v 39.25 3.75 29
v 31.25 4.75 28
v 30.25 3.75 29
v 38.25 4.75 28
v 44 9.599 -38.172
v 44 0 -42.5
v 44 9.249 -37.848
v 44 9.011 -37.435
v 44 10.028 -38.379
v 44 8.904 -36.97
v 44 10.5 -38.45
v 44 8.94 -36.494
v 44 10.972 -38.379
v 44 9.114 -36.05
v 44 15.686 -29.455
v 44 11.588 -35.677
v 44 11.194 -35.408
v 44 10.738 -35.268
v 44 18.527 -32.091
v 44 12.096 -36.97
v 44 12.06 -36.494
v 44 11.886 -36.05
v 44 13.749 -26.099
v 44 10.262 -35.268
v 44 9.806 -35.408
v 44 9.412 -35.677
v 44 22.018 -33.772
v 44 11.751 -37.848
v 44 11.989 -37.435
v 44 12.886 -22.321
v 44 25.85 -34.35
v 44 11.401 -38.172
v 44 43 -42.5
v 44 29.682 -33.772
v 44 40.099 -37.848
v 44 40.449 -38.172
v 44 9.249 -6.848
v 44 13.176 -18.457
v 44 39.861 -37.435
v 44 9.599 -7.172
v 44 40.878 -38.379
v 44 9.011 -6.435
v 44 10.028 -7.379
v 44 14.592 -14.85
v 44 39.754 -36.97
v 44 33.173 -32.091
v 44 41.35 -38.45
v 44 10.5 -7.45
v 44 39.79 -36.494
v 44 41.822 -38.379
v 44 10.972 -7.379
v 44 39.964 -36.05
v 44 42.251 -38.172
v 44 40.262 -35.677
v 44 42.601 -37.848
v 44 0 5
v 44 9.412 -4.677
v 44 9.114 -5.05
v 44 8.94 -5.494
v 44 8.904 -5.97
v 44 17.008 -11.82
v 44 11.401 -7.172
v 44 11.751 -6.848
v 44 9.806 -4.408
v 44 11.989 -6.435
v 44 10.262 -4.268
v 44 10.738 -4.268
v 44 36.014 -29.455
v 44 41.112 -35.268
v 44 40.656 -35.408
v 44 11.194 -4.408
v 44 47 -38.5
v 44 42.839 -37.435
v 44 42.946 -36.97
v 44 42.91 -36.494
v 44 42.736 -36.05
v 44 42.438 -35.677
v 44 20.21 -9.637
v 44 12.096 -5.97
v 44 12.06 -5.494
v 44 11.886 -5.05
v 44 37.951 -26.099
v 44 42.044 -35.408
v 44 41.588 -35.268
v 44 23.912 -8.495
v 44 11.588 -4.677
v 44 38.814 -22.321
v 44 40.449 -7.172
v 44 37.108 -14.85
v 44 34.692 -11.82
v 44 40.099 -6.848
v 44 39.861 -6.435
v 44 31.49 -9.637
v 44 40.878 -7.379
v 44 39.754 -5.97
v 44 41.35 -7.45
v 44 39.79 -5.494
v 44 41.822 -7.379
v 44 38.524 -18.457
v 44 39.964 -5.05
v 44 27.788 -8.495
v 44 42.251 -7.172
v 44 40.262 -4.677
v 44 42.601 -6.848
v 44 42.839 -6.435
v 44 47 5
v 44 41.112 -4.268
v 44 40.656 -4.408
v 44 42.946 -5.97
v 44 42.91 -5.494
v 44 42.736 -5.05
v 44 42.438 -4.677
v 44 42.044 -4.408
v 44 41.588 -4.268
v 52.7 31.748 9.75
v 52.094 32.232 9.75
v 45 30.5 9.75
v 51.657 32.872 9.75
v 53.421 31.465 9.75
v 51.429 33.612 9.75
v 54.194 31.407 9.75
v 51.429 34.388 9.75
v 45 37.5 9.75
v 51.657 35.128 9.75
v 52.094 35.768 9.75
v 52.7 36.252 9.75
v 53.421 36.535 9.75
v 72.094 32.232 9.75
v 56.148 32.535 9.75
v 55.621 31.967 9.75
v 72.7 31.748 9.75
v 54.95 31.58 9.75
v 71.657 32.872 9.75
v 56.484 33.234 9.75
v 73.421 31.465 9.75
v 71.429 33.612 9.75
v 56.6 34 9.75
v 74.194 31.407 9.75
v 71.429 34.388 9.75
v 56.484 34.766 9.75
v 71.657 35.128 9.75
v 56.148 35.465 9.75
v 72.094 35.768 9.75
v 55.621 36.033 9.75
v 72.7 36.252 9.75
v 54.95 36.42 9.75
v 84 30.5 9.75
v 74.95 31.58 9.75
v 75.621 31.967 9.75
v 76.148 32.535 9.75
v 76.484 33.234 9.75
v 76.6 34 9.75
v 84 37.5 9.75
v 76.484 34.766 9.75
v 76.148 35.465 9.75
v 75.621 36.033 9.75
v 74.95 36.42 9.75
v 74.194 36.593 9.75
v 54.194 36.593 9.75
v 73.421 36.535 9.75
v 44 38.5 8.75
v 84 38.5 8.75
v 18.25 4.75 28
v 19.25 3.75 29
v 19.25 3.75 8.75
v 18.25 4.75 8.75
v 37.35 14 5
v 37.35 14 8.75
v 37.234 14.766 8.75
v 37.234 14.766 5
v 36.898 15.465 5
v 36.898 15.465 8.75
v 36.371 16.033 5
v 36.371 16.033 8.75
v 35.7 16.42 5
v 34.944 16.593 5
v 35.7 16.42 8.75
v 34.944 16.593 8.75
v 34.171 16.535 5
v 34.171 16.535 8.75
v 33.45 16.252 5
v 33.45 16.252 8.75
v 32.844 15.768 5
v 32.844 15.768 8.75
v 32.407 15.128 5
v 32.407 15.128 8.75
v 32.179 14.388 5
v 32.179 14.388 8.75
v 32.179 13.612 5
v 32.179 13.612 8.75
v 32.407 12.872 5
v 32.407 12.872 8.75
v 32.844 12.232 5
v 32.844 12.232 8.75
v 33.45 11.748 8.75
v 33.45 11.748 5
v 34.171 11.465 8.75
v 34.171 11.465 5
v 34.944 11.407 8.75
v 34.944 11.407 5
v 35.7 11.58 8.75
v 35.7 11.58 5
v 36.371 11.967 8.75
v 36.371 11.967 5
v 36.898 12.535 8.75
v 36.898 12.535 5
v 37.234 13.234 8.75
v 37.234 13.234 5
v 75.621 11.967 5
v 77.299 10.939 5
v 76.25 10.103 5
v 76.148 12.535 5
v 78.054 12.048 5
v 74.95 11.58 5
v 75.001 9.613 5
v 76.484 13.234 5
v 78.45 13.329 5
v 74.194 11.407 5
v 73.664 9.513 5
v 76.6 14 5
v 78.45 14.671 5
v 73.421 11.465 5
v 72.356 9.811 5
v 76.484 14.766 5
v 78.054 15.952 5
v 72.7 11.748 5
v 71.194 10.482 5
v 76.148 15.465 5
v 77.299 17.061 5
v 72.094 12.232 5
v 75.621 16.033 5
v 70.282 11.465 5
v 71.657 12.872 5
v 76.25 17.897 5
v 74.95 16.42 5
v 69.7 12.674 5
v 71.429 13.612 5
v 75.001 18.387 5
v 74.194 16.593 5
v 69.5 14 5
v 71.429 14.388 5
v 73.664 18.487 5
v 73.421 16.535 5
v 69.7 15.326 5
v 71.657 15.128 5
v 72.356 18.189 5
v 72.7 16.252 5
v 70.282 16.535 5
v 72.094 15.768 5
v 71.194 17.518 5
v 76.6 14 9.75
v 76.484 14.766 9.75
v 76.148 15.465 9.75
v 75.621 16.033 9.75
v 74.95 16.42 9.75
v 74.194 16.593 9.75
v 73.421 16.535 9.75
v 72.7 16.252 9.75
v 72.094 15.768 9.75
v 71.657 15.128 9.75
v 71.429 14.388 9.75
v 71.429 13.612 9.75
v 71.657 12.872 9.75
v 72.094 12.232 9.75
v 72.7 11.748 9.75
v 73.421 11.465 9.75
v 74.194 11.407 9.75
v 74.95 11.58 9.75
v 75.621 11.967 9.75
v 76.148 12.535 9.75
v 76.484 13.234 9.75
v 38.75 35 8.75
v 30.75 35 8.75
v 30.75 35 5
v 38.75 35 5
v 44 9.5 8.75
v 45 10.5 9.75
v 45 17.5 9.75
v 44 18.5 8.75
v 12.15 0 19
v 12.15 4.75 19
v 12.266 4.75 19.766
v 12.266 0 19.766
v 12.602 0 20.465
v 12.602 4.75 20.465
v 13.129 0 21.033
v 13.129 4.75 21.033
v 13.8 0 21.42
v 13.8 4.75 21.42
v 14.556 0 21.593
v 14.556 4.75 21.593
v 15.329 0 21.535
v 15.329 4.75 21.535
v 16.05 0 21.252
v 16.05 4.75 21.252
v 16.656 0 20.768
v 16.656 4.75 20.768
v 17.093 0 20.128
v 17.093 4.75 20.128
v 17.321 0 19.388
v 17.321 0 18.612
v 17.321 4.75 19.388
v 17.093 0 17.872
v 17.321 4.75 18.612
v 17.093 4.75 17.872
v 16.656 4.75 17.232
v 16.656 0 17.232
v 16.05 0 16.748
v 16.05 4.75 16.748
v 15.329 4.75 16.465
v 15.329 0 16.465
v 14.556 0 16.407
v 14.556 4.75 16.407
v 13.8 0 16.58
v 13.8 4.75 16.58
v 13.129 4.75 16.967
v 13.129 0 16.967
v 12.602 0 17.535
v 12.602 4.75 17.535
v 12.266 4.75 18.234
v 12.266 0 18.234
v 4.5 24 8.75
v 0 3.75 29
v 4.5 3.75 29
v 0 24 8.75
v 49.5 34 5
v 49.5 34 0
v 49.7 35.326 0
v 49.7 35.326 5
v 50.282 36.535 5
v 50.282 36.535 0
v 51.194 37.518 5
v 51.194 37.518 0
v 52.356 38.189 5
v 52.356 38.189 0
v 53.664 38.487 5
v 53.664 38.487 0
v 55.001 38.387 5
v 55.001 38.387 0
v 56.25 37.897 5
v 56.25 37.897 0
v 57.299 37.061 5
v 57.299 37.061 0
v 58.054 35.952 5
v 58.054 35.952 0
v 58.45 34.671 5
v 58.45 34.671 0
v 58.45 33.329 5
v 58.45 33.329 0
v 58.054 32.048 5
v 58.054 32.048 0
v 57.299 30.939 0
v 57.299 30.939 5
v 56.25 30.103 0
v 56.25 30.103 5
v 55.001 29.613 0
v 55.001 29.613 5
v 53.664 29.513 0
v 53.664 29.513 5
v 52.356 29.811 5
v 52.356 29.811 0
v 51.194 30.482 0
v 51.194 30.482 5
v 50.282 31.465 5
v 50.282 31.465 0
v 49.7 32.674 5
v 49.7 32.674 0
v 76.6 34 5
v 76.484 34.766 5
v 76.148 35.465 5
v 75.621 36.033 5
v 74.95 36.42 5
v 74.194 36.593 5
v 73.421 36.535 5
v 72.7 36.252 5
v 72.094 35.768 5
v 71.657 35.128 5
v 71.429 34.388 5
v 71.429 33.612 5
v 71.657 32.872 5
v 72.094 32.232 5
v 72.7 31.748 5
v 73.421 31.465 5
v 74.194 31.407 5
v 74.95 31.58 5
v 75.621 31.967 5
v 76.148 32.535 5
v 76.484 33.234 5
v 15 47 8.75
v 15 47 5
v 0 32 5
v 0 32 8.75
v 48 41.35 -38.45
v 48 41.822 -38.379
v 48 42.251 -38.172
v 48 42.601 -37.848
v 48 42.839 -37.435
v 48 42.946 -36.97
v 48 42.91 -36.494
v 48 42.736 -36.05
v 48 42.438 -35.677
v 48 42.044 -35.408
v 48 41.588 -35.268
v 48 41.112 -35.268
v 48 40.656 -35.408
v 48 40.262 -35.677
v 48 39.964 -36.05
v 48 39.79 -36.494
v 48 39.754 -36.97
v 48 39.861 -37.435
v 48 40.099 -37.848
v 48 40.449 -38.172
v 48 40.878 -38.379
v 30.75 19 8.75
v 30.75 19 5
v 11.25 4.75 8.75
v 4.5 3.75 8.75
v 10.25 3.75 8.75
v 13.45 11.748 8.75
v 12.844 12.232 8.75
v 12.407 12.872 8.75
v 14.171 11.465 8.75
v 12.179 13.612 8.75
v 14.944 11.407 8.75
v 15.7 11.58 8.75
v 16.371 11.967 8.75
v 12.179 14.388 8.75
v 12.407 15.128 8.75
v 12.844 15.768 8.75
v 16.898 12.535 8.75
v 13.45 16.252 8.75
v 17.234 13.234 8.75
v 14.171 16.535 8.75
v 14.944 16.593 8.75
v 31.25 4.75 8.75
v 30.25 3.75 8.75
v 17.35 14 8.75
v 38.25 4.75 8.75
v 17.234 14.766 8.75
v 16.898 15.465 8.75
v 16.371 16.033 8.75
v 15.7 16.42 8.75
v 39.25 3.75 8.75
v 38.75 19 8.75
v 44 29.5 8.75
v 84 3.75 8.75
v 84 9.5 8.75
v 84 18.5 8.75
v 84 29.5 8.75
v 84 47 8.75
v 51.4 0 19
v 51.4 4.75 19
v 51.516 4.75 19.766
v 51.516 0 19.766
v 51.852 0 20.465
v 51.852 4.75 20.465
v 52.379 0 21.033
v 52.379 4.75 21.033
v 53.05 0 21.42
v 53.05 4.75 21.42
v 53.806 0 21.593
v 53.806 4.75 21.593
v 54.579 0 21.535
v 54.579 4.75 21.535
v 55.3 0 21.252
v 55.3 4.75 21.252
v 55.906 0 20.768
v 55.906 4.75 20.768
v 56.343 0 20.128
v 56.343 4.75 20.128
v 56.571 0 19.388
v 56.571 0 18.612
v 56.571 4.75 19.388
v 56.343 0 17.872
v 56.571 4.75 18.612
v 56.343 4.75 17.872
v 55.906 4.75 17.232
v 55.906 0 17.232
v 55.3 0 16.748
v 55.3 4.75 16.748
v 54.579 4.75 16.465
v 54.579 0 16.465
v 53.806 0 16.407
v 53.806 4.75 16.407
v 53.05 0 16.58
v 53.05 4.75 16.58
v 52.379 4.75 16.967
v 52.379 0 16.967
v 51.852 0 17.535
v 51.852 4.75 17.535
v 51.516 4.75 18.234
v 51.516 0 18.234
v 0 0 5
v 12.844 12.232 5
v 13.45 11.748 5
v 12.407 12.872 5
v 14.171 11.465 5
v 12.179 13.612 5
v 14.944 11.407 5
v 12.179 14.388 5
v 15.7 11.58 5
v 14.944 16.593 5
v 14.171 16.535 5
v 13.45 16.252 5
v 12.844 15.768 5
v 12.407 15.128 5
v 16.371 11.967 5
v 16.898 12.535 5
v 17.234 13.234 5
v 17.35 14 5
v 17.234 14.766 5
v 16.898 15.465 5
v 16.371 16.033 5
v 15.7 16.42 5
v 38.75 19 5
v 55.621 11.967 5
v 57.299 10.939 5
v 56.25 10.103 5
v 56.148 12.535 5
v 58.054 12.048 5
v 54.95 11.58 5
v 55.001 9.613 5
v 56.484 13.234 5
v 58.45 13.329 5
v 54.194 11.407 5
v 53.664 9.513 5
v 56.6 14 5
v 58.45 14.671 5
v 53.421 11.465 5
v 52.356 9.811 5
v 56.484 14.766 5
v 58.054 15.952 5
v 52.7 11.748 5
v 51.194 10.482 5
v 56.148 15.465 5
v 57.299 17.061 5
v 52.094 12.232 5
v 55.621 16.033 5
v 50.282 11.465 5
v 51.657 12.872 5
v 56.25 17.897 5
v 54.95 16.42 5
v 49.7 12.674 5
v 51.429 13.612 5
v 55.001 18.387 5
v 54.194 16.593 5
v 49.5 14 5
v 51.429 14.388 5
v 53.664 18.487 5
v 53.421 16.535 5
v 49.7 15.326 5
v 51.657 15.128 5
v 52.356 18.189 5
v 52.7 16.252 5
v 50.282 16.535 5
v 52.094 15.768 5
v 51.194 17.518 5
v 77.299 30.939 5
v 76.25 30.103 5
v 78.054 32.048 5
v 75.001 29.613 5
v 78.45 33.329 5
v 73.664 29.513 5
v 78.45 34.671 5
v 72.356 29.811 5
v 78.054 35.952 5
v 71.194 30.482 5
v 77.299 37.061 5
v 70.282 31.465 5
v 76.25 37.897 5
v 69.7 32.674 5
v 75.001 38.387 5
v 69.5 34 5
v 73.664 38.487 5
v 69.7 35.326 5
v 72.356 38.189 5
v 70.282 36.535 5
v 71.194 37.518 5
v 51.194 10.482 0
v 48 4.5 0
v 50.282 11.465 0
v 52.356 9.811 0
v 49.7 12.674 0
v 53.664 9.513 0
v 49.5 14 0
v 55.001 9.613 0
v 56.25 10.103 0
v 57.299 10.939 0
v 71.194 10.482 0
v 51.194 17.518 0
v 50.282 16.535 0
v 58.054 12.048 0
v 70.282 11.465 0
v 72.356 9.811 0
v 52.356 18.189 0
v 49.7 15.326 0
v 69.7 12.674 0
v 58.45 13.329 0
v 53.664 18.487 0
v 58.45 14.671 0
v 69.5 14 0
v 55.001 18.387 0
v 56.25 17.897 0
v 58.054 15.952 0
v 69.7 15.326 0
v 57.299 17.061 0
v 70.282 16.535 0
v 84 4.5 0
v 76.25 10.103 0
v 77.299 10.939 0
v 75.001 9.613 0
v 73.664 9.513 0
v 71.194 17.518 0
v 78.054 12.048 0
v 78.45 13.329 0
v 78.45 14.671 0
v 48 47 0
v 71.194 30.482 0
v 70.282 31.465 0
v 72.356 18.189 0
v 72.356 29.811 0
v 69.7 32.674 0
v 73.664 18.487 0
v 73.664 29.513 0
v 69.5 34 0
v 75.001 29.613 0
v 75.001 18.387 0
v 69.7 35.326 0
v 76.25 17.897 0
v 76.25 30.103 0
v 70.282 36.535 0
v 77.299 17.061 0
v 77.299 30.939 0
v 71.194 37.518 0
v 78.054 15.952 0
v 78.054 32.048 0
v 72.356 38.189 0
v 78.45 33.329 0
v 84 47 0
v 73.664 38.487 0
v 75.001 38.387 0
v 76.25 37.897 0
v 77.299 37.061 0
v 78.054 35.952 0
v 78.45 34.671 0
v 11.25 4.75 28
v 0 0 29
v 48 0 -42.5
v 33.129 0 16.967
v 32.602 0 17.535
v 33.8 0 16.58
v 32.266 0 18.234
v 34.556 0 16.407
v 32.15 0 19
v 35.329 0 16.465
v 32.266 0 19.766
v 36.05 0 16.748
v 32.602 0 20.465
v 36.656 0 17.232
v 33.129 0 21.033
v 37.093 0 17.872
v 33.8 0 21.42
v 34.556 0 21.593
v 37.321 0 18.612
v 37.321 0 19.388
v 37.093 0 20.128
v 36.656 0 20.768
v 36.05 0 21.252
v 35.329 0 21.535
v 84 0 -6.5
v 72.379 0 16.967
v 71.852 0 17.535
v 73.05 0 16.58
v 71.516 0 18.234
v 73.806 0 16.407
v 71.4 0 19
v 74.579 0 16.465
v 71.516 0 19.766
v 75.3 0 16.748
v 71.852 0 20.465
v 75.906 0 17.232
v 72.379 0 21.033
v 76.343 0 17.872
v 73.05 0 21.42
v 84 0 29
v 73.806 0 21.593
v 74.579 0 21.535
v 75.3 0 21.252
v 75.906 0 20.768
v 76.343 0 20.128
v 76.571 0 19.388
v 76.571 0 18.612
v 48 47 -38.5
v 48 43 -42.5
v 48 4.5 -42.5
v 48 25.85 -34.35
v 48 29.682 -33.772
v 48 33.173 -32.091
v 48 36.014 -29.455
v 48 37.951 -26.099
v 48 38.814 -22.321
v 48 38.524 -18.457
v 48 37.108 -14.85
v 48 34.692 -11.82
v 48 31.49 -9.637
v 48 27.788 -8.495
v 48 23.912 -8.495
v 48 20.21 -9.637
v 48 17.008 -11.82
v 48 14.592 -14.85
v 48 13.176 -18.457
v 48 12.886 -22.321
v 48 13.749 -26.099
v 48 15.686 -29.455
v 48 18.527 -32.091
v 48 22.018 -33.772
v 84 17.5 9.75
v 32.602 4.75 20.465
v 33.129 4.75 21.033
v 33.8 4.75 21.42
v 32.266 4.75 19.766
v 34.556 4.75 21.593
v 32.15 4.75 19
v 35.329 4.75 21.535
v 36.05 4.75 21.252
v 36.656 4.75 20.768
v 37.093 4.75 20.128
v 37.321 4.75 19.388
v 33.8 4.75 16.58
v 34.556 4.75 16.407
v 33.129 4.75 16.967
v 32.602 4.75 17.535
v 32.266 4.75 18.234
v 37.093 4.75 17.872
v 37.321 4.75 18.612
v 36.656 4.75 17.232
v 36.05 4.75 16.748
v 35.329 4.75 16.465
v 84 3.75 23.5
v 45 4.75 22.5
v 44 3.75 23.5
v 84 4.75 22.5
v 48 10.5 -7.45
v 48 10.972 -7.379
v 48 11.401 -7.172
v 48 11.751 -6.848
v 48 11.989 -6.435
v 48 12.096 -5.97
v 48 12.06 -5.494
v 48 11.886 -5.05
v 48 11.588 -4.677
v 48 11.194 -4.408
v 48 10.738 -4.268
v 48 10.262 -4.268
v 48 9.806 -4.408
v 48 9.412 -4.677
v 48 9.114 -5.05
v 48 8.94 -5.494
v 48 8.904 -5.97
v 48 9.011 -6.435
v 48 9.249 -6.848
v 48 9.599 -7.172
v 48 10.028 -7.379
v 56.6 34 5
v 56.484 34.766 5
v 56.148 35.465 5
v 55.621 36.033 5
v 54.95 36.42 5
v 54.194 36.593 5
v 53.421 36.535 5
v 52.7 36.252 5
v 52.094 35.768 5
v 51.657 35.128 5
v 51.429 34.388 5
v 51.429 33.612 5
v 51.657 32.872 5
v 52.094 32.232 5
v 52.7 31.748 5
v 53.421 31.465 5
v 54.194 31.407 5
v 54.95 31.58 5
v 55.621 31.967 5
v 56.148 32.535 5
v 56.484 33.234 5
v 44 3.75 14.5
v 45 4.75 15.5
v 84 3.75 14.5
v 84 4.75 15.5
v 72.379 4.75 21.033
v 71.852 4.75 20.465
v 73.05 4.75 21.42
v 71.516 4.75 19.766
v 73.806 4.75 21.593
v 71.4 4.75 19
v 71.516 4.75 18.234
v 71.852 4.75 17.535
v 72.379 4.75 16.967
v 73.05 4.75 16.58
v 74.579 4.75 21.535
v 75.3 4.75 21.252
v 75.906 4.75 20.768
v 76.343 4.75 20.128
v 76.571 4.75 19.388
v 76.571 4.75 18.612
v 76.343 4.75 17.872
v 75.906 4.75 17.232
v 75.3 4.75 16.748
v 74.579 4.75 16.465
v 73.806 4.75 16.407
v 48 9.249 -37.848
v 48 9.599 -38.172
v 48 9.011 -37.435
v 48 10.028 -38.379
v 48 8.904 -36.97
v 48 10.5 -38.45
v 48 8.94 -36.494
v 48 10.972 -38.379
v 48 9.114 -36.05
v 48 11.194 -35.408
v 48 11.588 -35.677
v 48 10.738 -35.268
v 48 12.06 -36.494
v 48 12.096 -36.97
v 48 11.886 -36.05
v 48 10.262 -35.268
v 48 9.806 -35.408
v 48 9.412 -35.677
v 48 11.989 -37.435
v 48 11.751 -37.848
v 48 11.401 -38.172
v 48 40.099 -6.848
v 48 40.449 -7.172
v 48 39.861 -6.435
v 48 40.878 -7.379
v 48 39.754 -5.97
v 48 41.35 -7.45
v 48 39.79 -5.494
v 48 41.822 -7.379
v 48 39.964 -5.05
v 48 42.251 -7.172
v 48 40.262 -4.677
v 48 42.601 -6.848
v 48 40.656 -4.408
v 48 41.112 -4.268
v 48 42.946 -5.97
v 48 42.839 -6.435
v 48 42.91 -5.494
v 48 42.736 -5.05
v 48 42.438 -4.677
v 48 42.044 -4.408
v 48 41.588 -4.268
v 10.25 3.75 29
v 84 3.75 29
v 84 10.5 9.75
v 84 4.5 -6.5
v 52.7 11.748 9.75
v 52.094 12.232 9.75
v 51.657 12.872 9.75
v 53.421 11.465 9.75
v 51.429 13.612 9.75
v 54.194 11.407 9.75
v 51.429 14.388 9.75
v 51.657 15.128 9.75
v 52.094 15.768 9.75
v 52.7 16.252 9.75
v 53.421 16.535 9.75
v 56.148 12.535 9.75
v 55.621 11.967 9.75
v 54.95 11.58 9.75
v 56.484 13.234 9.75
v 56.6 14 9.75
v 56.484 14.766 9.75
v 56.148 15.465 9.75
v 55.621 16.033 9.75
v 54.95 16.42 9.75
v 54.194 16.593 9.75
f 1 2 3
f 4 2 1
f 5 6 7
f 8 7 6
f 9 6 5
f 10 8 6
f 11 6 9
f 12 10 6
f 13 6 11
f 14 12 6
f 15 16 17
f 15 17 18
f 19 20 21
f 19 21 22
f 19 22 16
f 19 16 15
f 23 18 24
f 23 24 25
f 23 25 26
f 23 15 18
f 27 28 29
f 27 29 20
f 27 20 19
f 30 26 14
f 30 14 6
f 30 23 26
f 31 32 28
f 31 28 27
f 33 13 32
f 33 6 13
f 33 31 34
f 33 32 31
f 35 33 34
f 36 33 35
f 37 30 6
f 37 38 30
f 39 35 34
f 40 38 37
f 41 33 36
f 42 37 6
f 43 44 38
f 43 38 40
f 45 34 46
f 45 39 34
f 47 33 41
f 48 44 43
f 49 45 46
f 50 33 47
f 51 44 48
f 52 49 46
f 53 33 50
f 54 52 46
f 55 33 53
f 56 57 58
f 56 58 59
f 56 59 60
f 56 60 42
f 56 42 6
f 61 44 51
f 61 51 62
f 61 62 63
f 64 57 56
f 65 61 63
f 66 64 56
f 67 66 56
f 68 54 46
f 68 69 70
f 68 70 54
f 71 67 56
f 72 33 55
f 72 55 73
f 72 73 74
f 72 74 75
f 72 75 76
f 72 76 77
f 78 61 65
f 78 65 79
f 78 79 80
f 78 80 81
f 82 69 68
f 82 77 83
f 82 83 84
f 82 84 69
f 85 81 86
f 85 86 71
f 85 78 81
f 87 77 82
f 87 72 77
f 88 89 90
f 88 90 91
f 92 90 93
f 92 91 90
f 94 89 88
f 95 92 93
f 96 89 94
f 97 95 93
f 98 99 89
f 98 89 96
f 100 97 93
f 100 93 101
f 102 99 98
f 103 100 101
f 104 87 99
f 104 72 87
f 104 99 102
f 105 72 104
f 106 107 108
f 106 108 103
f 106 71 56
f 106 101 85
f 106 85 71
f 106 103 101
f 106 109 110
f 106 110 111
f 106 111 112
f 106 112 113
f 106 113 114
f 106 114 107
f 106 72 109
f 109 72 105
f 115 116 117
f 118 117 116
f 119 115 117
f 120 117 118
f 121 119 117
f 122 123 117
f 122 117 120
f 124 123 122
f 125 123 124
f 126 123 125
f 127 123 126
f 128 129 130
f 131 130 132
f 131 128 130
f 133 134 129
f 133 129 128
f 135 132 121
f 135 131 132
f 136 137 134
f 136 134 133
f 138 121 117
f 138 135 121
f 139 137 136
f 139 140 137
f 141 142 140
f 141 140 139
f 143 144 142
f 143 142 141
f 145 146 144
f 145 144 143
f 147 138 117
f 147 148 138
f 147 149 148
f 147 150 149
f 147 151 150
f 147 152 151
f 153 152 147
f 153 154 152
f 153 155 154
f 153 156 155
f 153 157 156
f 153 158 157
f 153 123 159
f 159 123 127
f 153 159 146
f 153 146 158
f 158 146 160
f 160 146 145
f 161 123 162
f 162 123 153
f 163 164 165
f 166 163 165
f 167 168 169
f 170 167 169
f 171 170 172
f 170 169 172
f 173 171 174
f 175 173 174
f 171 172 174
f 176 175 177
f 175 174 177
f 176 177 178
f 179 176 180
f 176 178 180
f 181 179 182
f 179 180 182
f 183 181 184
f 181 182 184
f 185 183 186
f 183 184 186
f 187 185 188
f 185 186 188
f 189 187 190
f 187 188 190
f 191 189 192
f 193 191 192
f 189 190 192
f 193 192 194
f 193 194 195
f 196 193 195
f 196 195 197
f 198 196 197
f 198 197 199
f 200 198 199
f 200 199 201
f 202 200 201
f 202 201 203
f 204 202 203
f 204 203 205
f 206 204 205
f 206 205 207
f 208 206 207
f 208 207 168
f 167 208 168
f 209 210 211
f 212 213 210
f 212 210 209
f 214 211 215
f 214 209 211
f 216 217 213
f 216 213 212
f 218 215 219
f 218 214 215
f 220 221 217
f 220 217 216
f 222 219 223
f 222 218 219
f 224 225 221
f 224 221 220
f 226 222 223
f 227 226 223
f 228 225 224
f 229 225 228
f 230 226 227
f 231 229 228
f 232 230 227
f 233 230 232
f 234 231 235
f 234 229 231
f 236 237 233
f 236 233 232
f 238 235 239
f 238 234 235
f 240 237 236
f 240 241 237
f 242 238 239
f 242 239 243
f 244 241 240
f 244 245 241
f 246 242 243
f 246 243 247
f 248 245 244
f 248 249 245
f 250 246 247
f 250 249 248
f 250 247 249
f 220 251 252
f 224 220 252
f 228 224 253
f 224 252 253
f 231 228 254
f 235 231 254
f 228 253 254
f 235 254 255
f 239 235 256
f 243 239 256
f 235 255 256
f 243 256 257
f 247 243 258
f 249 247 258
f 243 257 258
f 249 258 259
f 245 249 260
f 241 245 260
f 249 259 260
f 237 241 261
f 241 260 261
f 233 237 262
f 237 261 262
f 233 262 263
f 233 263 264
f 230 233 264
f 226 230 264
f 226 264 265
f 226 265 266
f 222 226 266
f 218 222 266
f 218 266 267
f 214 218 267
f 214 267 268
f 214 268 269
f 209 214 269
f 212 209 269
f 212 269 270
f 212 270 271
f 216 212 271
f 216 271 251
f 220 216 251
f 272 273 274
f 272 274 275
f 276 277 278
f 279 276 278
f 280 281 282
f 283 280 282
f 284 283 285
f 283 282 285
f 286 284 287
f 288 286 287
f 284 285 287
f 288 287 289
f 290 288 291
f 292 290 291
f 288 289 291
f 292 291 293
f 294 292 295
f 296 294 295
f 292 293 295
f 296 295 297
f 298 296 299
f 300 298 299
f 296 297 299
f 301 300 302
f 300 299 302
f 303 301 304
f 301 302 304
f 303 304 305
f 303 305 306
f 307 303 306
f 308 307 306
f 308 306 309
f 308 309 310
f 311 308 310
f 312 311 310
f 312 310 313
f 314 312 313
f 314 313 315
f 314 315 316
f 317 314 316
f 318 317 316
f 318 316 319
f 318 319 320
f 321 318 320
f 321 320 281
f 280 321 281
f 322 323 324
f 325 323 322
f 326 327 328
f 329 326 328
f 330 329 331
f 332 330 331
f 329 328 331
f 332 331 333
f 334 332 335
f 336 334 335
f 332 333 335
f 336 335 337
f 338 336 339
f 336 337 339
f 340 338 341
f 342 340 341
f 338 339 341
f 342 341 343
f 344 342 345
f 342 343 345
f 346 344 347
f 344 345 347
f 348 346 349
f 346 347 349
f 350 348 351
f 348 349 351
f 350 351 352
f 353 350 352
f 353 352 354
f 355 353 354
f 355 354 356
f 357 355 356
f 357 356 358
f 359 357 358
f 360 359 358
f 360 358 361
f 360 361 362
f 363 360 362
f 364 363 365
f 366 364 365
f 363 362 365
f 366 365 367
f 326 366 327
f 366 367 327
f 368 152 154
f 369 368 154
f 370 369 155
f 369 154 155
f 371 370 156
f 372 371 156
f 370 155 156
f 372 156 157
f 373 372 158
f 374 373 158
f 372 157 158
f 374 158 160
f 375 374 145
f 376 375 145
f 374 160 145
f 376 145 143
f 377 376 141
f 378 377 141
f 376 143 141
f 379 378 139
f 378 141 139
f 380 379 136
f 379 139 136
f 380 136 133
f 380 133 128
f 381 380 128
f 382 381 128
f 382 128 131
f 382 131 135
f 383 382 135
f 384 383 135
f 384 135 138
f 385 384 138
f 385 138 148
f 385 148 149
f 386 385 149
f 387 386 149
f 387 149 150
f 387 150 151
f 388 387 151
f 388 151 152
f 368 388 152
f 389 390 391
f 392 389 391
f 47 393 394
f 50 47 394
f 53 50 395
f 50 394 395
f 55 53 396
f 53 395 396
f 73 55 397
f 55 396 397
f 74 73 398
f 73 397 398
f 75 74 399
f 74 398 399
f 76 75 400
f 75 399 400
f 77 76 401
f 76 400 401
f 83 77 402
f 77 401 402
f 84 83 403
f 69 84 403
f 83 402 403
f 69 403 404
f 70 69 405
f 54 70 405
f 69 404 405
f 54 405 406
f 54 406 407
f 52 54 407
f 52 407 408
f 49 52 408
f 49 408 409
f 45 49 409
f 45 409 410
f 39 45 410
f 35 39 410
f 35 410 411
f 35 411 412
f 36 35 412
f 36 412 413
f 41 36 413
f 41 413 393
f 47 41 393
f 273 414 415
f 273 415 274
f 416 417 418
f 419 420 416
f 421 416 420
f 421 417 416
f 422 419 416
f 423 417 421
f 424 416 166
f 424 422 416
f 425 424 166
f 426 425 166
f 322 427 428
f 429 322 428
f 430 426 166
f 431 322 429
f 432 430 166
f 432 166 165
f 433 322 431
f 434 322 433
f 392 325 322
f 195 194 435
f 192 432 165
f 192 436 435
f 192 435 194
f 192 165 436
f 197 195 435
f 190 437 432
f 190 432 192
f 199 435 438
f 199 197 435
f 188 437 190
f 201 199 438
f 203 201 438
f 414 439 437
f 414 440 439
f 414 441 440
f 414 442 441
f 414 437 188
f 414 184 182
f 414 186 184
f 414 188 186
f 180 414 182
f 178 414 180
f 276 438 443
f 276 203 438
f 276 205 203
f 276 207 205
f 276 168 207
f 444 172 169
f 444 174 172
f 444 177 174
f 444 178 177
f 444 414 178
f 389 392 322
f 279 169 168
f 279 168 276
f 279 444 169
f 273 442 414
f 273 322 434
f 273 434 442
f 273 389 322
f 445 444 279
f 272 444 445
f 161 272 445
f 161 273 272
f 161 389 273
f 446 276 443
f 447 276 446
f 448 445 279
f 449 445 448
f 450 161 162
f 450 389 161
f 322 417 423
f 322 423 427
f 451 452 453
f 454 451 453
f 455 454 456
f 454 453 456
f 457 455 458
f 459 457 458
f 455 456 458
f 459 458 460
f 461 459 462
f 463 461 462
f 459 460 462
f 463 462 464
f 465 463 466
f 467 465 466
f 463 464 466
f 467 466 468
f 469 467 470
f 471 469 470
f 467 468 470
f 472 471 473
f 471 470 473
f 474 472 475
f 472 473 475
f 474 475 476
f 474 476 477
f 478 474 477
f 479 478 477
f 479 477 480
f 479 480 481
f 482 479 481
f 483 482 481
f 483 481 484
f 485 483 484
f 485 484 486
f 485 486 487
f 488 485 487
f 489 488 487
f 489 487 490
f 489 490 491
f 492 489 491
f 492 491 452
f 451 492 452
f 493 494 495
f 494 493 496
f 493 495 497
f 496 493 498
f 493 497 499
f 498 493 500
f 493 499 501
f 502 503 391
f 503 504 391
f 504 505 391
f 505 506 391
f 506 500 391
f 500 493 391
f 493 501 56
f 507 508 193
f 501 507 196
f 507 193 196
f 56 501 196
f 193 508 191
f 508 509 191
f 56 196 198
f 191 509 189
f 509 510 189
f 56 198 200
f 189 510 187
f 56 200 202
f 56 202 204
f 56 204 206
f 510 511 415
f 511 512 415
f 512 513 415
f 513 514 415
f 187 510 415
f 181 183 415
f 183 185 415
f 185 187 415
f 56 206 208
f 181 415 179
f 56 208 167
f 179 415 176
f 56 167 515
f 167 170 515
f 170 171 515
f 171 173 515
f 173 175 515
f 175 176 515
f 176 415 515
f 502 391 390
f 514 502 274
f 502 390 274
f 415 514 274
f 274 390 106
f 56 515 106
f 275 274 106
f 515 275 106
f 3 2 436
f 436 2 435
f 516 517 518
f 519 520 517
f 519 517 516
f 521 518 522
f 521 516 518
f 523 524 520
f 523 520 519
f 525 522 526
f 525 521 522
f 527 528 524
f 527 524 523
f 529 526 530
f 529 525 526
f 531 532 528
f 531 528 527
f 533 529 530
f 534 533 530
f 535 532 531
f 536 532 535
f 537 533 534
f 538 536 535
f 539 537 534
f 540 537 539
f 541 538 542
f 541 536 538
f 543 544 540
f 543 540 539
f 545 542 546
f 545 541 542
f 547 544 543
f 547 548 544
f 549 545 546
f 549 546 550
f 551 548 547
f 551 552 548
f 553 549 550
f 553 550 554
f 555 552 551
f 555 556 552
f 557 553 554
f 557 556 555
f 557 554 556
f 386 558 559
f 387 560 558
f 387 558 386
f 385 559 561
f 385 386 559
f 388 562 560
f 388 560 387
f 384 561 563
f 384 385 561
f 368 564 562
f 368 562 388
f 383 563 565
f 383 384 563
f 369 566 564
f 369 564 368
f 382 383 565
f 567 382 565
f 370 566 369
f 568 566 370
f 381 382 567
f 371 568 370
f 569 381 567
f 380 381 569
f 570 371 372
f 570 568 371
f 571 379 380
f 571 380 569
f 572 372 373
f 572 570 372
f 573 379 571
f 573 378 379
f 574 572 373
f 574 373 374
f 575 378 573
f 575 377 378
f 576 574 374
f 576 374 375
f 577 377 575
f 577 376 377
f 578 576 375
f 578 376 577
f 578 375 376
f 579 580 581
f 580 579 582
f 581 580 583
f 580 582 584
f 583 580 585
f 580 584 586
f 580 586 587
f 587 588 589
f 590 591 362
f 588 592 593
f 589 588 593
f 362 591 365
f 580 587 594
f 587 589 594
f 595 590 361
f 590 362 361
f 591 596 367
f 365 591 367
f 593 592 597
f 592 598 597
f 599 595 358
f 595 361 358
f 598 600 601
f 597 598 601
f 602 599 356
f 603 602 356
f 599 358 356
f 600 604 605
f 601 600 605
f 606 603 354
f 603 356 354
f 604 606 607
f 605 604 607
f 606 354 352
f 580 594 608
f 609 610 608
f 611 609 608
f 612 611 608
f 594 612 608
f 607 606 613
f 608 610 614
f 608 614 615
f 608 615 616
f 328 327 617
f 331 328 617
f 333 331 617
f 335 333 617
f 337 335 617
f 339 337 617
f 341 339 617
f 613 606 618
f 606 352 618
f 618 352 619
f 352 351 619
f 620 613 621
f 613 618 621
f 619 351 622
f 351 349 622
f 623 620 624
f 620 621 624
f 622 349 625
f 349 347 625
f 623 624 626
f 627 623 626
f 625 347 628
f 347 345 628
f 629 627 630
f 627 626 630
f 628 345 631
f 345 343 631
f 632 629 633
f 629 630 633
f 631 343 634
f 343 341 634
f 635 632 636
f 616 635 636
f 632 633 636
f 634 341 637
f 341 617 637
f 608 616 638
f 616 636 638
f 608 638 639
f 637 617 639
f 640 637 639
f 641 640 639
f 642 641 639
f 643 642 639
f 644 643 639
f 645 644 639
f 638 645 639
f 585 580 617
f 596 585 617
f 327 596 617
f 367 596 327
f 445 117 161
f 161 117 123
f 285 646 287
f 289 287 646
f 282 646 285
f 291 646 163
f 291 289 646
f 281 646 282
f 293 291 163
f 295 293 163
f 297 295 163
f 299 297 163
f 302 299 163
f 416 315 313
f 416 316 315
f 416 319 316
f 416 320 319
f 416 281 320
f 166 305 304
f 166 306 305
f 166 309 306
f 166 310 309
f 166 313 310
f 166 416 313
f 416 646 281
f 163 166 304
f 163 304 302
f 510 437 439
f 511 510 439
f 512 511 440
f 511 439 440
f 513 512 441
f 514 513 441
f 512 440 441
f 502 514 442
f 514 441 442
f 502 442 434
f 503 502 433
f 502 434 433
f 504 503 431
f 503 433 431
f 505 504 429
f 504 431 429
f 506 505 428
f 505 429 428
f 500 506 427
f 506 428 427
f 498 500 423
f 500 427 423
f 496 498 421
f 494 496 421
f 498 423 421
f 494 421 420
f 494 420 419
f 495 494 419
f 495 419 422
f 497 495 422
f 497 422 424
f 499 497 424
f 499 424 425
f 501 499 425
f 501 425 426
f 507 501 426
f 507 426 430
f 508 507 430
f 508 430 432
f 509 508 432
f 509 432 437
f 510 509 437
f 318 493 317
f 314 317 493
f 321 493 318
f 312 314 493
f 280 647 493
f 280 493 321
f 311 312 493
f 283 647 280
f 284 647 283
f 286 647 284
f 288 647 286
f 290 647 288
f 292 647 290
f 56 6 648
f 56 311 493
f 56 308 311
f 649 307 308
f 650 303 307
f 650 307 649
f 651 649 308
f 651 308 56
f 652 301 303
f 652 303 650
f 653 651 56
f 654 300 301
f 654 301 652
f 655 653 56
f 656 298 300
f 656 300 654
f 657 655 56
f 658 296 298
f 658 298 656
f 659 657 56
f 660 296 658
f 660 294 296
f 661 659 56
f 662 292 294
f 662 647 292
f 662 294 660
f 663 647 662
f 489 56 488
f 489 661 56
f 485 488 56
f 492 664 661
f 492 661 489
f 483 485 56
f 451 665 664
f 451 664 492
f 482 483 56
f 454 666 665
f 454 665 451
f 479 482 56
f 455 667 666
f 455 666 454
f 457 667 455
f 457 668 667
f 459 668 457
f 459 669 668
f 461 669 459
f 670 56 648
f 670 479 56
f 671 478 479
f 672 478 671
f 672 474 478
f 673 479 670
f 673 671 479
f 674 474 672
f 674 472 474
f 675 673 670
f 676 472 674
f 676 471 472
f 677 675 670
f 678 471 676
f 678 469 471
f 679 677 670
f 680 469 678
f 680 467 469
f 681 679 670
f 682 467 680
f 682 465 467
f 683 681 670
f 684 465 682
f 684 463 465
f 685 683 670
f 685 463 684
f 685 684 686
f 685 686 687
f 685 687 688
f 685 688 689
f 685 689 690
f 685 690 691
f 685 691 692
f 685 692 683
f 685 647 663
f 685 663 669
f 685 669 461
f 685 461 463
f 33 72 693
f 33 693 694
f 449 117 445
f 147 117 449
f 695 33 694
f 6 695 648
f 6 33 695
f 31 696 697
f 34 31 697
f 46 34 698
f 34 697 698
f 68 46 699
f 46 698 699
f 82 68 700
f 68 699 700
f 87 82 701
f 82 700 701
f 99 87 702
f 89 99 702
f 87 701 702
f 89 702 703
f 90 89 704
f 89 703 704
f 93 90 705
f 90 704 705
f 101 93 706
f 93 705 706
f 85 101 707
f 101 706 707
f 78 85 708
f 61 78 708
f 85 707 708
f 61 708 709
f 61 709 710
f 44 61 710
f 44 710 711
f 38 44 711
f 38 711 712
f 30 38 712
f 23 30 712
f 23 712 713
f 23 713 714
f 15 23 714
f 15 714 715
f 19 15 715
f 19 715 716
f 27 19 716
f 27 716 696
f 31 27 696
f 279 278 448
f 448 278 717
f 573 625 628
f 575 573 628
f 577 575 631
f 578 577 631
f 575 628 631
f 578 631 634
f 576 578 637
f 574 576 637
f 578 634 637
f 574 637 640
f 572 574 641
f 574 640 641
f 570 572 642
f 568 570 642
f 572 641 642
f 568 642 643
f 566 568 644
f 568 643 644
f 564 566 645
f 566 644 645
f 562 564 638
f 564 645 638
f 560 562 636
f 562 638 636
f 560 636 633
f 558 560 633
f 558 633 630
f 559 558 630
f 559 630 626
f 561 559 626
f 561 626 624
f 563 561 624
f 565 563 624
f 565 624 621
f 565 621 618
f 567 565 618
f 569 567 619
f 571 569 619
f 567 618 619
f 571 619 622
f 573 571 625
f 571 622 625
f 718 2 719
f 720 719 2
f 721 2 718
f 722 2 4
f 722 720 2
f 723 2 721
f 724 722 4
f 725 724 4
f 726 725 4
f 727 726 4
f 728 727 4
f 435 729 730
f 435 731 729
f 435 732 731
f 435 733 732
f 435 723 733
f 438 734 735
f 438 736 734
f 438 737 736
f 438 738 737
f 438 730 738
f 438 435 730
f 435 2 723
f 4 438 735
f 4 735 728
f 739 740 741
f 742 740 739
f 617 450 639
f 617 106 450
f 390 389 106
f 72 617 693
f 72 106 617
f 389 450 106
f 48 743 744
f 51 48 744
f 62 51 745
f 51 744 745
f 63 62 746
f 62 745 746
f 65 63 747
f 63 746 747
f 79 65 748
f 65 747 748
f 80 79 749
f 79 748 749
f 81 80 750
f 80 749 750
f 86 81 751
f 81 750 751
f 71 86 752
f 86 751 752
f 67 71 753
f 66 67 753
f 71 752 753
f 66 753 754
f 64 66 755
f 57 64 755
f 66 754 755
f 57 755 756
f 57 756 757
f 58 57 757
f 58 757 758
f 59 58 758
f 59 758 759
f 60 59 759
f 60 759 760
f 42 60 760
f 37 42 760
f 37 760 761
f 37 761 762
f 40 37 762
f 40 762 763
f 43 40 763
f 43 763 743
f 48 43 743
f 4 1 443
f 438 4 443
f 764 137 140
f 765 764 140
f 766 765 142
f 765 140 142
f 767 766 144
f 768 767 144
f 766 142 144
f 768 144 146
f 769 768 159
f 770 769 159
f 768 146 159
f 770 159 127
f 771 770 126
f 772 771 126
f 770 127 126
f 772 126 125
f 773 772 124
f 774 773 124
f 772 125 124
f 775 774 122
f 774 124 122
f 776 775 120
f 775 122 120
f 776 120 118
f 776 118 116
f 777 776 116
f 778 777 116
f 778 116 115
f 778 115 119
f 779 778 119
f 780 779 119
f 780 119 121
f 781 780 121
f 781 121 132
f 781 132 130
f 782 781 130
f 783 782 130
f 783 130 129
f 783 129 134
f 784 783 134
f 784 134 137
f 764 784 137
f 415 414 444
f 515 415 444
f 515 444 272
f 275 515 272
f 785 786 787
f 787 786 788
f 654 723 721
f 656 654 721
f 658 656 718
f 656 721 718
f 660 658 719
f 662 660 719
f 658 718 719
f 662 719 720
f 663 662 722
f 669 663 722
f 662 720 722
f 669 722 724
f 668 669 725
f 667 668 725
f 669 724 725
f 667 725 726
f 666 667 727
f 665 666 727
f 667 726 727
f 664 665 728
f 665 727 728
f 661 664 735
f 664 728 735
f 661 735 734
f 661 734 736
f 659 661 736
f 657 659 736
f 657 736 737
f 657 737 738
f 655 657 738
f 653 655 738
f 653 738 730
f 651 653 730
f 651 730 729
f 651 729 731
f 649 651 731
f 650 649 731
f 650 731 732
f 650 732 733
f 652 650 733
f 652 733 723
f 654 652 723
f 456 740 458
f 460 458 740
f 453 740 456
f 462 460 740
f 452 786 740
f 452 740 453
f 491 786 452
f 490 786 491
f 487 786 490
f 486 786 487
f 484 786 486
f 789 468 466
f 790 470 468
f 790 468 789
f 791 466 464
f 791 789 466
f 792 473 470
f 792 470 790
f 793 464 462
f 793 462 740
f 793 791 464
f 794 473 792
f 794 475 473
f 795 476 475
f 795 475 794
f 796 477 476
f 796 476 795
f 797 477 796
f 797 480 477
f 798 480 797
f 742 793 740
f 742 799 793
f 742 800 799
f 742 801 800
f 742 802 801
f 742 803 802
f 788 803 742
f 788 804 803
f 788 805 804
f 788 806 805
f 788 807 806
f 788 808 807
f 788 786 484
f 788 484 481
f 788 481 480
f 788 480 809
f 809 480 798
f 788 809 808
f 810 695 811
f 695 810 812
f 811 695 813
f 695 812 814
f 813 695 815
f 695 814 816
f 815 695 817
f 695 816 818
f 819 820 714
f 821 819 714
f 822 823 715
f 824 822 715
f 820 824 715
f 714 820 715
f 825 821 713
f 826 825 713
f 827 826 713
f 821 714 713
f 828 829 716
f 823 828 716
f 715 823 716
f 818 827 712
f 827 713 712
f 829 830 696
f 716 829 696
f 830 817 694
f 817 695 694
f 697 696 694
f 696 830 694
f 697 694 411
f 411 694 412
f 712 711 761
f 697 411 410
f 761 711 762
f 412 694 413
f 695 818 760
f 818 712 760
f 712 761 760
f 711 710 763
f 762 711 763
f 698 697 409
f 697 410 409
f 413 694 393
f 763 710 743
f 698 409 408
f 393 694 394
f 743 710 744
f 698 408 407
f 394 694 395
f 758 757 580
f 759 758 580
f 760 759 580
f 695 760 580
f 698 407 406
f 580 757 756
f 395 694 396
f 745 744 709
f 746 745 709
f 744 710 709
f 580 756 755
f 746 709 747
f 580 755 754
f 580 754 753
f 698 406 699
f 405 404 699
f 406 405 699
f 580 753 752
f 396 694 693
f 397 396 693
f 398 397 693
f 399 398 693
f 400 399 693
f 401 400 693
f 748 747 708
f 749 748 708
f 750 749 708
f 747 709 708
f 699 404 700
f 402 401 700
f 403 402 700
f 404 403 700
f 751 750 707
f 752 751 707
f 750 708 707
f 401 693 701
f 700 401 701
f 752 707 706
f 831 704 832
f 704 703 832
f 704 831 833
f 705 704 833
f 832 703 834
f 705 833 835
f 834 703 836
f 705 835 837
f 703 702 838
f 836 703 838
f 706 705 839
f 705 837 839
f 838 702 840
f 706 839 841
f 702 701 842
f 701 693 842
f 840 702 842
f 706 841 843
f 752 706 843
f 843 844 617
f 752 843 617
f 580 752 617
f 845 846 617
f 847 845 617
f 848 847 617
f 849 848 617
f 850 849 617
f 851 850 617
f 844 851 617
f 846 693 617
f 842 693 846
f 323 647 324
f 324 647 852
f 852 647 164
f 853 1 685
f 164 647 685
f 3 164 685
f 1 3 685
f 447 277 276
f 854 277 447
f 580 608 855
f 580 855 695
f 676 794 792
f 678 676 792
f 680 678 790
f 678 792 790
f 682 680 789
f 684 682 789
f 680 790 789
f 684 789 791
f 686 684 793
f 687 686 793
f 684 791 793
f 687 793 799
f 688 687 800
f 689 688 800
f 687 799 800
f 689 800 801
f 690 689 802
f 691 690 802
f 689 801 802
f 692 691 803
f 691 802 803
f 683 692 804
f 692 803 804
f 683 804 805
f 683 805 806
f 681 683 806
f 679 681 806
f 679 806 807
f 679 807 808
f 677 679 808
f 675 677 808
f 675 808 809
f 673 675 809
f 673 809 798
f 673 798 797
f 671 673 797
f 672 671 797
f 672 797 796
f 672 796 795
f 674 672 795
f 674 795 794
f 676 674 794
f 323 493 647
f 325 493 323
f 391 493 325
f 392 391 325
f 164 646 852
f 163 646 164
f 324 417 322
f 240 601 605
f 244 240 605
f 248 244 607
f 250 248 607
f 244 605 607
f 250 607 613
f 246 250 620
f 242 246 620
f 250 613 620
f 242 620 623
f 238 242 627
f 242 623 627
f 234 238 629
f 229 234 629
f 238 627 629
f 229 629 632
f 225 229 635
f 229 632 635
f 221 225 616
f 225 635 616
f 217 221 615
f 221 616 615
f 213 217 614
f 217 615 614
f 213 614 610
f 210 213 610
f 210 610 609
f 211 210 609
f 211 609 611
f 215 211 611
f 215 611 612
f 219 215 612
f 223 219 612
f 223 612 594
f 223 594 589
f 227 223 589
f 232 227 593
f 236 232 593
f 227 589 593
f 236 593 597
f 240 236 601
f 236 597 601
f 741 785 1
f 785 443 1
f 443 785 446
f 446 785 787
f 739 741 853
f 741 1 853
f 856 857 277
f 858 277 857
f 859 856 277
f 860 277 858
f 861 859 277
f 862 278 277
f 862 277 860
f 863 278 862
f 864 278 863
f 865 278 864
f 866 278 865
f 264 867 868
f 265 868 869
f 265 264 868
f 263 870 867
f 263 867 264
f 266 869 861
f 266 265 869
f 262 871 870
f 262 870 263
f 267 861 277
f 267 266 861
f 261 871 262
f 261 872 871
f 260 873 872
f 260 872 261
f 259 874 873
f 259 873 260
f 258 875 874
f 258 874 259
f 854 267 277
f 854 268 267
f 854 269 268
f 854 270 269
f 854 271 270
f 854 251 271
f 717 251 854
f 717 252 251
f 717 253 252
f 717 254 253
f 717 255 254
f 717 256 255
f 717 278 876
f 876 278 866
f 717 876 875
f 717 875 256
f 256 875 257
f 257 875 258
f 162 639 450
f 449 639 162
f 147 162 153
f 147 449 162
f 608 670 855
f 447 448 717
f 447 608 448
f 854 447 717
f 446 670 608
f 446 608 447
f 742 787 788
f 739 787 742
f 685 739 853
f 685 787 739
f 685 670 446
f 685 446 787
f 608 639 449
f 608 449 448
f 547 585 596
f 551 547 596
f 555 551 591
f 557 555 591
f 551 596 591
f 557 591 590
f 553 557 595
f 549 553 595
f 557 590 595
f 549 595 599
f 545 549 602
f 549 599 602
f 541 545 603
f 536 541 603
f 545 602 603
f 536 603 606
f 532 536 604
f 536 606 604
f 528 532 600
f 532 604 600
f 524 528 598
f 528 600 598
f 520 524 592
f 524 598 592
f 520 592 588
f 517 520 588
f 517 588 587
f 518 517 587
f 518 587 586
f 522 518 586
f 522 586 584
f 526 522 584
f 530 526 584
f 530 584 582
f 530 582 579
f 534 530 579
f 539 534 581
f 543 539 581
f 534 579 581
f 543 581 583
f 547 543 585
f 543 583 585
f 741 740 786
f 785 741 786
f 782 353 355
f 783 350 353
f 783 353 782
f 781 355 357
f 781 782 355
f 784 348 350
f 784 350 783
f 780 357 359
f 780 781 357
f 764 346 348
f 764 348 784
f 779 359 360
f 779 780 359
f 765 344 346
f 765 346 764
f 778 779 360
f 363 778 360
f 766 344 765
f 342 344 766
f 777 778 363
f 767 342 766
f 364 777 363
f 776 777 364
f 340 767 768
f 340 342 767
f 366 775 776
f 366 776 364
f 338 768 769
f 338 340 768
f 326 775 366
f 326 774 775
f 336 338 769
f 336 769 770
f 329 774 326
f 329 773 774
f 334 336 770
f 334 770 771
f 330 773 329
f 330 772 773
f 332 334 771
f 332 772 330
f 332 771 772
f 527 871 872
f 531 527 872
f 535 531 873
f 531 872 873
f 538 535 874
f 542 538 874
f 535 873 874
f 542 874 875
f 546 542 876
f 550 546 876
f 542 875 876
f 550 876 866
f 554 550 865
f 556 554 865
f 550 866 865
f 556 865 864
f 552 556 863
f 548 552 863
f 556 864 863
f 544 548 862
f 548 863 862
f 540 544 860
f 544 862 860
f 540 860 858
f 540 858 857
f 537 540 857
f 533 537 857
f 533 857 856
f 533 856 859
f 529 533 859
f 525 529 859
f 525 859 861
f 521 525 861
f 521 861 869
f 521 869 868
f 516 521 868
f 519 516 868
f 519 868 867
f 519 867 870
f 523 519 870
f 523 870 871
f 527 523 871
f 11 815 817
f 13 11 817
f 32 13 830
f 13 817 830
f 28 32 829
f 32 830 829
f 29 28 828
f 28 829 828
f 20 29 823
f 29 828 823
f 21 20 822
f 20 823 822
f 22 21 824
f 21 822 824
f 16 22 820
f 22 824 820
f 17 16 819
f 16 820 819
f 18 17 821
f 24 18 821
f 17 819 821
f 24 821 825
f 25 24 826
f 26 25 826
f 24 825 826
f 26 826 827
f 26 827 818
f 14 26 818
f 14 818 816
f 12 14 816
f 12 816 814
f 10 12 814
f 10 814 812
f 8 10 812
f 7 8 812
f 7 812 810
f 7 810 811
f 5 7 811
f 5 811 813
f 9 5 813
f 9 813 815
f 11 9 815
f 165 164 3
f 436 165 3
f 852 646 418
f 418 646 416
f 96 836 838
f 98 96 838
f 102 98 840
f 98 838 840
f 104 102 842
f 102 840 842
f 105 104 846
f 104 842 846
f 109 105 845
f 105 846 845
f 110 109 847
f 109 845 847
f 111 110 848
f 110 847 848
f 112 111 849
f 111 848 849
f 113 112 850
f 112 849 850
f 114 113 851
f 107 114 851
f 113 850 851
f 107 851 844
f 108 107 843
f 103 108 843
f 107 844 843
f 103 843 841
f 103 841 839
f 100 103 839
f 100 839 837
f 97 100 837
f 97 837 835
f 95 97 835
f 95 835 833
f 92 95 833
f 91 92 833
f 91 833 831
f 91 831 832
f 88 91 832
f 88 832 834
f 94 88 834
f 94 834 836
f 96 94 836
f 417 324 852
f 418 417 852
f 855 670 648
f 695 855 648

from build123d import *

# Parameters (mm, degrees)
BOSS_EXTRUDE1_DEPTH = 8.75
CUT_EXTRUDE1_DEPTH  = 5
BOSS_EXTRUDE2_DEPTH = 4
BOSS_EXTRUDE3_DEPTH = 4.5
SKETCH5_W           = 84
SKETCH5_H           = 20.25
BOSS_EXTRUDE4_DEPTH = 3.75
BOSS_EXTRUDE5_DEPTH = 4.5
SKETCH7_W           = 40
SKETCH7_H           = 9
SKETCH7_W_2         = 9
SKETCH7_H_2         = 20.25
BOSS_EXTRUDE6_DEPTH = 1
SKETCH8_W           = 40
SKETCH8_H           = 9
BOSS_EXTRUDE7_DEPTH = 1
CHAMFER1_SIZE       = 1
CUT_EXTRUDE2_REACH  = 105.186
SKETCH9_R           = 2.6
CUT_EXTRUDE3_REACH  = 111.522
SKETCH10_R          = 2.6
SKETCH10_W          = 8
SKETCH10_H          = 16
SKETCH12_R          = 4.5
CUT_EXTRUDE4_DEPTH  = 5
CUT_EXTRUDE5_REACH  = 81.494
SKETCH13_R          = 1.6
SKETCH13_R_2        = 13


with BuildPart() as part:
    # Sketch1 → Boss-Extrude1 (new body)
    with BuildSketch(Plane.XY):
        Polygon((0, 0), (84, 0), (84, 47), (15, 47), (0, 32), align=None)
    extrude(amount=BOSS_EXTRUDE1_DEPTH)

    # Sketch2 → Cut-Extrude1 (cut)
    with BuildSketch(Plane(origin=(0, 0, 0), x_dir=(-1, 0, 0), z_dir=(0, 0, -1))):
        Polygon((0, 0), (-44, 0), (-44, 47), (-15, 47), (0, 32), align=None)
    extrude(amount=-CUT_EXTRUDE1_DEPTH, mode=Mode.SUBTRACT)

    # Sketch3 → Boss-Extrude2 (add)
    with BuildSketch(Plane.ZY.offset(-44)):
        Polygon((0, 47), (-38.5, 47), (-42.5, 43), (-42.5, 0), (0, 0), align=None)
    extrude(amount=-BOSS_EXTRUDE2_DEPTH)

    # Sketch4 → Boss-Extrude3 (add)
    with BuildSketch(Plane.XZ):
        Polygon((48, 0), (84, 0), (84, -6.5), (48, -42.5), align=None)
    extrude(amount=-BOSS_EXTRUDE3_DEPTH)

    # Sketch5 → Boss-Extrude4 (add)
    with BuildSketch(Plane.XZ):
        with Locations((42, 18.875)):
            Rectangle(SKETCH5_W, SKETCH5_H)
    extrude(amount=-BOSS_EXTRUDE4_DEPTH)

    # Sketch6 → Boss-Extrude5 (add)
    with BuildSketch(Plane.ZY):
        Polygon((8.75, 3.75), (29, 3.75), (8.75, 24), align=None)
    extrude(amount=-BOSS_EXTRUDE5_DEPTH)

    # Sketch7 → Boss-Extrude6 (add)
    with BuildSketch(Plane(origin=(0, 3.75, 0), x_dir=(1, 0, 0), z_dir=(0, 1, 0))):
        with Locations((64, -19)):
            Rectangle(SKETCH7_W, SKETCH7_H)
        with Locations((14.75, -18.875)):
            Rectangle(SKETCH7_W_2, SKETCH7_H_2)
        with Locations((34.75, -18.875)):
            Rectangle(SKETCH7_W_2, SKETCH7_H_2)
    extrude(amount=BOSS_EXTRUDE6_DEPTH)

    # Sketch8 → Boss-Extrude7 (add)
    with BuildSketch(Plane.XY.offset(8.75)):
        with Locations((64, 14)):
            Rectangle(SKETCH8_W, SKETCH8_H)
        with Locations((64, 34)):
            Rectangle(SKETCH8_W, SKETCH8_H)
    extrude(amount=BOSS_EXTRUDE7_DEPTH)

    # Chamfer1
    chamfer1_edges = [part.edges().sort_by_distance(p)[0] for p in [
        (19.25, 4.75, 18.875),
        (14.75, 4.75, 29),
        (10.25, 4.75, 18.875),
        (30.25, 4.75, 18.875),
        (34.75, 4.75, 29),
        (39.25, 4.75, 18.875),
        (64, 4.75, 14.5),
        (64, 4.75, 23.5),
        (44, 4.75, 19),
        (64, 29.5, 9.75),
        (44, 34, 9.75),
        (64, 38.5, 9.75),
        (64, 9.5, 9.75),
        (64, 18.5, 9.75),
        (44, 14, 9.75),
    ]]
    chamfer(chamfer1_edges, length=CHAMFER1_SIZE - 0.0001)  # a hair under: the kernel refuses the full size

    # Sketch9 → Cut-Extrude2 (cut, up to next)
    with BuildSketch(Plane(origin=(0, 4.75, 0), x_dir=(1, 0, 0), z_dir=(0, 1, 0)), mode=Mode.PRIVATE) as cut_extrude2_sk1:
        with Locations(Location((14.75, -19, 0), (0, 0, 180))):
            Circle(SKETCH9_R)
    cut_extrude2_tool1 = extrude(cut_extrude2_sk1.sketch, amount=-CUT_EXTRUDE2_REACH, mode=Mode.PRIVATE) & part.part
    # Sketch9 → Cut-Extrude2 (cut, up to next)
    with BuildSketch(Plane(origin=(0, 4.75, 0), x_dir=(1, 0, 0), z_dir=(0, 1, 0)), mode=Mode.PRIVATE) as cut_extrude2_sk2:
        with Locations(Location((34.75, -19, 0), (0, 0, 180))):
            Circle(SKETCH9_R)
    cut_extrude2_tool2 = extrude(cut_extrude2_sk2.sketch, amount=-CUT_EXTRUDE2_REACH, mode=Mode.PRIVATE) & part.part
    # Sketch9 → Cut-Extrude2 (cut, up to next)
    with BuildSketch(Plane(origin=(0, 4.75, 0), x_dir=(1, 0, 0), z_dir=(0, 1, 0)), mode=Mode.PRIVATE) as cut_extrude2_sk3:
        with Locations(Location((54, -19, 0), (0, 0, 180))):
            Circle(SKETCH9_R)
    cut_extrude2_tool3 = extrude(cut_extrude2_sk3.sketch, amount=-CUT_EXTRUDE2_REACH, mode=Mode.PRIVATE) & part.part
    # Sketch9 → Cut-Extrude2 (cut, up to next)
    with BuildSketch(Plane(origin=(0, 4.75, 0), x_dir=(1, 0, 0), z_dir=(0, 1, 0)), mode=Mode.PRIVATE) as cut_extrude2_sk4:
        with Locations(Location((74, -19, 0), (0, 0, 180))):
            Circle(SKETCH9_R)
    cut_extrude2_tool4 = extrude(cut_extrude2_sk4.sketch, amount=-CUT_EXTRUDE2_REACH, mode=Mode.PRIVATE) & part.part
    add(cut_extrude2_tool1.solids().sort_by_distance((14.75, 4.75, 19))[0], mode=Mode.SUBTRACT)
    add(cut_extrude2_tool2.solids().sort_by_distance((34.75, 4.75, 19))[0], mode=Mode.SUBTRACT)
    add(cut_extrude2_tool3.solids().sort_by_distance((54, 4.75, 19))[0], mode=Mode.SUBTRACT)
    add(cut_extrude2_tool4.solids().sort_by_distance((74, 4.75, 19))[0], mode=Mode.SUBTRACT)

    # Sketch10 → Cut-Extrude3 (cut, up to next)
    with BuildSketch(Plane.XY.offset(9.75), mode=Mode.PRIVATE) as cut_extrude3_sk1:
        with Locations((54, 34)):
            Circle(SKETCH10_R)
    cut_extrude3_tool1 = extrude(cut_extrude3_sk1.sketch, amount=-CUT_EXTRUDE3_REACH, mode=Mode.PRIVATE) & part.part
    # Sketch10 → Cut-Extrude3 (cut, up to next)
    with BuildSketch(Plane.XY.offset(9.75), mode=Mode.PRIVATE) as cut_extrude3_sk2:
        with Locations((74, 34)):
            Circle(SKETCH10_R)
    cut_extrude3_tool2 = extrude(cut_extrude3_sk2.sketch, amount=-CUT_EXTRUDE3_REACH, mode=Mode.PRIVATE) & part.part
    # Sketch10 → Cut-Extrude3 (cut, up to next)
    with BuildSketch(Plane.XY.offset(9.75), mode=Mode.PRIVATE) as cut_extrude3_sk3:
        with Locations((54, 14)):
            Circle(SKETCH10_R)
    cut_extrude3_tool3 = extrude(cut_extrude3_sk3.sketch, amount=-CUT_EXTRUDE3_REACH, mode=Mode.PRIVATE) & part.part
    # Sketch10 → Cut-Extrude3 (cut, up to next)
    with BuildSketch(Plane.XY.offset(9.75), mode=Mode.PRIVATE) as cut_extrude3_sk4:
        with Locations((74, 14)):
            Circle(SKETCH10_R)
    cut_extrude3_tool4 = extrude(cut_extrude3_sk4.sketch, amount=-CUT_EXTRUDE3_REACH, mode=Mode.PRIVATE) & part.part
    # Sketch10 → Cut-Extrude3 (cut, up to next)
    with BuildSketch(Plane.XY.offset(9.75), mode=Mode.PRIVATE) as cut_extrude3_sk5:
        with Locations((34.75, 14)):
            Circle(SKETCH10_R)
    cut_extrude3_tool5 = extrude(cut_extrude3_sk5.sketch, amount=-CUT_EXTRUDE3_REACH, mode=Mode.PRIVATE) & part.part
    # Sketch10 → Cut-Extrude3 (cut, up to next)
    with BuildSketch(Plane.XY.offset(9.75), mode=Mode.PRIVATE) as cut_extrude3_sk6:
        with Locations((14.75, 14)):
            Circle(SKETCH10_R)
    cut_extrude3_tool6 = extrude(cut_extrude3_sk6.sketch, amount=-CUT_EXTRUDE3_REACH, mode=Mode.PRIVATE) & part.part
    # Sketch10 → Cut-Extrude3 (cut, up to next)
    with BuildSketch(Plane.XY.offset(9.75), mode=Mode.PRIVATE) as cut_extrude3_sk7:
        with Locations((34.75, 27)):
            Rectangle(SKETCH10_W, SKETCH10_H)
    cut_extrude3_tool7 = extrude(cut_extrude3_sk7.sketch, amount=-CUT_EXTRUDE3_REACH, mode=Mode.PRIVATE) & part.part
    add(cut_extrude3_tool1.solids().sort_by_distance((54, 34, 9.75))[0], mode=Mode.SUBTRACT)
    add(cut_extrude3_tool2.solids().sort_by_distance((74, 34, 9.75))[0], mode=Mode.SUBTRACT)
    add(cut_extrude3_tool3.solids().sort_by_distance((54, 14, 9.75))[0], mode=Mode.SUBTRACT)
    add(cut_extrude3_tool4.solids().sort_by_distance((74, 14, 9.75))[0], mode=Mode.SUBTRACT)
    add(cut_extrude3_tool5.solids().sort_by_distance((34.75, 14, 9.75))[0], mode=Mode.SUBTRACT)
    add(cut_extrude3_tool6.solids().sort_by_distance((14.75, 14, 9.75))[0], mode=Mode.SUBTRACT)
    add(cut_extrude3_tool7.solids().sort_by_distance((34.75, 27, 9.75))[0], mode=Mode.SUBTRACT)

    # Sketch12 → Cut-Extrude4 (cut)
    with BuildSketch(Plane(origin=(0, 0, 0), x_dir=(-1, 0, 0), z_dir=(0, 0, -1))):
        with Locations((-54, 34)):
            Circle(SKETCH12_R)
        with Locations((-74, 34)):
            Circle(SKETCH12_R)
        with Locations((-74, 14)):
            Circle(SKETCH12_R)
        with Locations((-54, 14)):
            Circle(SKETCH12_R)
    extrude(amount=-CUT_EXTRUDE4_DEPTH, mode=Mode.SUBTRACT)

    # Sketch13 → Cut-Extrude5 (cut, up to next)
    with BuildSketch(Plane(origin=(48, 0, 0), x_dir=(0, 0, -1), z_dir=(1, 0, 0)), mode=Mode.PRIVATE) as cut_extrude5_sk1:
        with Locations((5.85, 41.35)):
            Circle(SKETCH13_R)
    cut_extrude5_tool1 = extrude(cut_extrude5_sk1.sketch, amount=-CUT_EXTRUDE5_REACH, mode=Mode.PRIVATE) & part.part
    # Sketch13 → Cut-Extrude5 (cut, up to next)
    with BuildSketch(Plane(origin=(48, 0, 0), x_dir=(0, 0, -1), z_dir=(1, 0, 0)), mode=Mode.PRIVATE) as cut_extrude5_sk2:
        with Locations((36.85, 41.35)):
            Circle(SKETCH13_R)
    cut_extrude5_tool2 = extrude(cut_extrude5_sk2.sketch, amount=-CUT_EXTRUDE5_REACH, mode=Mode.PRIVATE) & part.part
    # Sketch13 → Cut-Extrude5 (cut, up to next)
    with BuildSketch(Plane(origin=(48, 0, 0), x_dir=(0, 0, -1), z_dir=(1, 0, 0)), mode=Mode.PRIVATE) as cut_extrude5_sk3:
        with Locations((36.85, 10.5)):
            Circle(SKETCH13_R)
    cut_extrude5_tool3 = extrude(cut_extrude5_sk3.sketch, amount=-CUT_EXTRUDE5_REACH, mode=Mode.PRIVATE) & part.part
    # Sketch13 → Cut-Extrude5 (cut, up to next)
    with BuildSketch(Plane(origin=(48, 0, 0), x_dir=(0, 0, -1), z_dir=(1, 0, 0)), mode=Mode.PRIVATE) as cut_extrude5_sk4:
        with Locations((5.85, 10.5)):
            Circle(SKETCH13_R)
    cut_extrude5_tool4 = extrude(cut_extrude5_sk4.sketch, amount=-CUT_EXTRUDE5_REACH, mode=Mode.PRIVATE) & part.part
    # Sketch13 → Cut-Extrude5 (cut, up to next)
    with BuildSketch(Plane(origin=(48, 0, 0), x_dir=(0, 0, -1), z_dir=(1, 0, 0)), mode=Mode.PRIVATE) as cut_extrude5_sk5:
        with Locations((21.35, 25.85)):
            Circle(SKETCH13_R_2)
    cut_extrude5_tool5 = extrude(cut_extrude5_sk5.sketch, amount=-CUT_EXTRUDE5_REACH, mode=Mode.PRIVATE) & part.part
    add(cut_extrude5_tool1.solids().sort_by_distance((48, 41.35, -5.85))[0], mode=Mode.SUBTRACT)
    add(cut_extrude5_tool2.solids().sort_by_distance((48, 41.35, -36.85))[0], mode=Mode.SUBTRACT)
    add(cut_extrude5_tool3.solids().sort_by_distance((48, 10.5, -36.85))[0], mode=Mode.SUBTRACT)
    add(cut_extrude5_tool4.solids().sort_by_distance((48, 10.5, -5.85))[0], mode=Mode.SUBTRACT)
    add(cut_extrude5_tool5.solids().sort_by_distance((48, 25.85, -21.35))[0], mode=Mode.SUBTRACT)


solid = part.part
